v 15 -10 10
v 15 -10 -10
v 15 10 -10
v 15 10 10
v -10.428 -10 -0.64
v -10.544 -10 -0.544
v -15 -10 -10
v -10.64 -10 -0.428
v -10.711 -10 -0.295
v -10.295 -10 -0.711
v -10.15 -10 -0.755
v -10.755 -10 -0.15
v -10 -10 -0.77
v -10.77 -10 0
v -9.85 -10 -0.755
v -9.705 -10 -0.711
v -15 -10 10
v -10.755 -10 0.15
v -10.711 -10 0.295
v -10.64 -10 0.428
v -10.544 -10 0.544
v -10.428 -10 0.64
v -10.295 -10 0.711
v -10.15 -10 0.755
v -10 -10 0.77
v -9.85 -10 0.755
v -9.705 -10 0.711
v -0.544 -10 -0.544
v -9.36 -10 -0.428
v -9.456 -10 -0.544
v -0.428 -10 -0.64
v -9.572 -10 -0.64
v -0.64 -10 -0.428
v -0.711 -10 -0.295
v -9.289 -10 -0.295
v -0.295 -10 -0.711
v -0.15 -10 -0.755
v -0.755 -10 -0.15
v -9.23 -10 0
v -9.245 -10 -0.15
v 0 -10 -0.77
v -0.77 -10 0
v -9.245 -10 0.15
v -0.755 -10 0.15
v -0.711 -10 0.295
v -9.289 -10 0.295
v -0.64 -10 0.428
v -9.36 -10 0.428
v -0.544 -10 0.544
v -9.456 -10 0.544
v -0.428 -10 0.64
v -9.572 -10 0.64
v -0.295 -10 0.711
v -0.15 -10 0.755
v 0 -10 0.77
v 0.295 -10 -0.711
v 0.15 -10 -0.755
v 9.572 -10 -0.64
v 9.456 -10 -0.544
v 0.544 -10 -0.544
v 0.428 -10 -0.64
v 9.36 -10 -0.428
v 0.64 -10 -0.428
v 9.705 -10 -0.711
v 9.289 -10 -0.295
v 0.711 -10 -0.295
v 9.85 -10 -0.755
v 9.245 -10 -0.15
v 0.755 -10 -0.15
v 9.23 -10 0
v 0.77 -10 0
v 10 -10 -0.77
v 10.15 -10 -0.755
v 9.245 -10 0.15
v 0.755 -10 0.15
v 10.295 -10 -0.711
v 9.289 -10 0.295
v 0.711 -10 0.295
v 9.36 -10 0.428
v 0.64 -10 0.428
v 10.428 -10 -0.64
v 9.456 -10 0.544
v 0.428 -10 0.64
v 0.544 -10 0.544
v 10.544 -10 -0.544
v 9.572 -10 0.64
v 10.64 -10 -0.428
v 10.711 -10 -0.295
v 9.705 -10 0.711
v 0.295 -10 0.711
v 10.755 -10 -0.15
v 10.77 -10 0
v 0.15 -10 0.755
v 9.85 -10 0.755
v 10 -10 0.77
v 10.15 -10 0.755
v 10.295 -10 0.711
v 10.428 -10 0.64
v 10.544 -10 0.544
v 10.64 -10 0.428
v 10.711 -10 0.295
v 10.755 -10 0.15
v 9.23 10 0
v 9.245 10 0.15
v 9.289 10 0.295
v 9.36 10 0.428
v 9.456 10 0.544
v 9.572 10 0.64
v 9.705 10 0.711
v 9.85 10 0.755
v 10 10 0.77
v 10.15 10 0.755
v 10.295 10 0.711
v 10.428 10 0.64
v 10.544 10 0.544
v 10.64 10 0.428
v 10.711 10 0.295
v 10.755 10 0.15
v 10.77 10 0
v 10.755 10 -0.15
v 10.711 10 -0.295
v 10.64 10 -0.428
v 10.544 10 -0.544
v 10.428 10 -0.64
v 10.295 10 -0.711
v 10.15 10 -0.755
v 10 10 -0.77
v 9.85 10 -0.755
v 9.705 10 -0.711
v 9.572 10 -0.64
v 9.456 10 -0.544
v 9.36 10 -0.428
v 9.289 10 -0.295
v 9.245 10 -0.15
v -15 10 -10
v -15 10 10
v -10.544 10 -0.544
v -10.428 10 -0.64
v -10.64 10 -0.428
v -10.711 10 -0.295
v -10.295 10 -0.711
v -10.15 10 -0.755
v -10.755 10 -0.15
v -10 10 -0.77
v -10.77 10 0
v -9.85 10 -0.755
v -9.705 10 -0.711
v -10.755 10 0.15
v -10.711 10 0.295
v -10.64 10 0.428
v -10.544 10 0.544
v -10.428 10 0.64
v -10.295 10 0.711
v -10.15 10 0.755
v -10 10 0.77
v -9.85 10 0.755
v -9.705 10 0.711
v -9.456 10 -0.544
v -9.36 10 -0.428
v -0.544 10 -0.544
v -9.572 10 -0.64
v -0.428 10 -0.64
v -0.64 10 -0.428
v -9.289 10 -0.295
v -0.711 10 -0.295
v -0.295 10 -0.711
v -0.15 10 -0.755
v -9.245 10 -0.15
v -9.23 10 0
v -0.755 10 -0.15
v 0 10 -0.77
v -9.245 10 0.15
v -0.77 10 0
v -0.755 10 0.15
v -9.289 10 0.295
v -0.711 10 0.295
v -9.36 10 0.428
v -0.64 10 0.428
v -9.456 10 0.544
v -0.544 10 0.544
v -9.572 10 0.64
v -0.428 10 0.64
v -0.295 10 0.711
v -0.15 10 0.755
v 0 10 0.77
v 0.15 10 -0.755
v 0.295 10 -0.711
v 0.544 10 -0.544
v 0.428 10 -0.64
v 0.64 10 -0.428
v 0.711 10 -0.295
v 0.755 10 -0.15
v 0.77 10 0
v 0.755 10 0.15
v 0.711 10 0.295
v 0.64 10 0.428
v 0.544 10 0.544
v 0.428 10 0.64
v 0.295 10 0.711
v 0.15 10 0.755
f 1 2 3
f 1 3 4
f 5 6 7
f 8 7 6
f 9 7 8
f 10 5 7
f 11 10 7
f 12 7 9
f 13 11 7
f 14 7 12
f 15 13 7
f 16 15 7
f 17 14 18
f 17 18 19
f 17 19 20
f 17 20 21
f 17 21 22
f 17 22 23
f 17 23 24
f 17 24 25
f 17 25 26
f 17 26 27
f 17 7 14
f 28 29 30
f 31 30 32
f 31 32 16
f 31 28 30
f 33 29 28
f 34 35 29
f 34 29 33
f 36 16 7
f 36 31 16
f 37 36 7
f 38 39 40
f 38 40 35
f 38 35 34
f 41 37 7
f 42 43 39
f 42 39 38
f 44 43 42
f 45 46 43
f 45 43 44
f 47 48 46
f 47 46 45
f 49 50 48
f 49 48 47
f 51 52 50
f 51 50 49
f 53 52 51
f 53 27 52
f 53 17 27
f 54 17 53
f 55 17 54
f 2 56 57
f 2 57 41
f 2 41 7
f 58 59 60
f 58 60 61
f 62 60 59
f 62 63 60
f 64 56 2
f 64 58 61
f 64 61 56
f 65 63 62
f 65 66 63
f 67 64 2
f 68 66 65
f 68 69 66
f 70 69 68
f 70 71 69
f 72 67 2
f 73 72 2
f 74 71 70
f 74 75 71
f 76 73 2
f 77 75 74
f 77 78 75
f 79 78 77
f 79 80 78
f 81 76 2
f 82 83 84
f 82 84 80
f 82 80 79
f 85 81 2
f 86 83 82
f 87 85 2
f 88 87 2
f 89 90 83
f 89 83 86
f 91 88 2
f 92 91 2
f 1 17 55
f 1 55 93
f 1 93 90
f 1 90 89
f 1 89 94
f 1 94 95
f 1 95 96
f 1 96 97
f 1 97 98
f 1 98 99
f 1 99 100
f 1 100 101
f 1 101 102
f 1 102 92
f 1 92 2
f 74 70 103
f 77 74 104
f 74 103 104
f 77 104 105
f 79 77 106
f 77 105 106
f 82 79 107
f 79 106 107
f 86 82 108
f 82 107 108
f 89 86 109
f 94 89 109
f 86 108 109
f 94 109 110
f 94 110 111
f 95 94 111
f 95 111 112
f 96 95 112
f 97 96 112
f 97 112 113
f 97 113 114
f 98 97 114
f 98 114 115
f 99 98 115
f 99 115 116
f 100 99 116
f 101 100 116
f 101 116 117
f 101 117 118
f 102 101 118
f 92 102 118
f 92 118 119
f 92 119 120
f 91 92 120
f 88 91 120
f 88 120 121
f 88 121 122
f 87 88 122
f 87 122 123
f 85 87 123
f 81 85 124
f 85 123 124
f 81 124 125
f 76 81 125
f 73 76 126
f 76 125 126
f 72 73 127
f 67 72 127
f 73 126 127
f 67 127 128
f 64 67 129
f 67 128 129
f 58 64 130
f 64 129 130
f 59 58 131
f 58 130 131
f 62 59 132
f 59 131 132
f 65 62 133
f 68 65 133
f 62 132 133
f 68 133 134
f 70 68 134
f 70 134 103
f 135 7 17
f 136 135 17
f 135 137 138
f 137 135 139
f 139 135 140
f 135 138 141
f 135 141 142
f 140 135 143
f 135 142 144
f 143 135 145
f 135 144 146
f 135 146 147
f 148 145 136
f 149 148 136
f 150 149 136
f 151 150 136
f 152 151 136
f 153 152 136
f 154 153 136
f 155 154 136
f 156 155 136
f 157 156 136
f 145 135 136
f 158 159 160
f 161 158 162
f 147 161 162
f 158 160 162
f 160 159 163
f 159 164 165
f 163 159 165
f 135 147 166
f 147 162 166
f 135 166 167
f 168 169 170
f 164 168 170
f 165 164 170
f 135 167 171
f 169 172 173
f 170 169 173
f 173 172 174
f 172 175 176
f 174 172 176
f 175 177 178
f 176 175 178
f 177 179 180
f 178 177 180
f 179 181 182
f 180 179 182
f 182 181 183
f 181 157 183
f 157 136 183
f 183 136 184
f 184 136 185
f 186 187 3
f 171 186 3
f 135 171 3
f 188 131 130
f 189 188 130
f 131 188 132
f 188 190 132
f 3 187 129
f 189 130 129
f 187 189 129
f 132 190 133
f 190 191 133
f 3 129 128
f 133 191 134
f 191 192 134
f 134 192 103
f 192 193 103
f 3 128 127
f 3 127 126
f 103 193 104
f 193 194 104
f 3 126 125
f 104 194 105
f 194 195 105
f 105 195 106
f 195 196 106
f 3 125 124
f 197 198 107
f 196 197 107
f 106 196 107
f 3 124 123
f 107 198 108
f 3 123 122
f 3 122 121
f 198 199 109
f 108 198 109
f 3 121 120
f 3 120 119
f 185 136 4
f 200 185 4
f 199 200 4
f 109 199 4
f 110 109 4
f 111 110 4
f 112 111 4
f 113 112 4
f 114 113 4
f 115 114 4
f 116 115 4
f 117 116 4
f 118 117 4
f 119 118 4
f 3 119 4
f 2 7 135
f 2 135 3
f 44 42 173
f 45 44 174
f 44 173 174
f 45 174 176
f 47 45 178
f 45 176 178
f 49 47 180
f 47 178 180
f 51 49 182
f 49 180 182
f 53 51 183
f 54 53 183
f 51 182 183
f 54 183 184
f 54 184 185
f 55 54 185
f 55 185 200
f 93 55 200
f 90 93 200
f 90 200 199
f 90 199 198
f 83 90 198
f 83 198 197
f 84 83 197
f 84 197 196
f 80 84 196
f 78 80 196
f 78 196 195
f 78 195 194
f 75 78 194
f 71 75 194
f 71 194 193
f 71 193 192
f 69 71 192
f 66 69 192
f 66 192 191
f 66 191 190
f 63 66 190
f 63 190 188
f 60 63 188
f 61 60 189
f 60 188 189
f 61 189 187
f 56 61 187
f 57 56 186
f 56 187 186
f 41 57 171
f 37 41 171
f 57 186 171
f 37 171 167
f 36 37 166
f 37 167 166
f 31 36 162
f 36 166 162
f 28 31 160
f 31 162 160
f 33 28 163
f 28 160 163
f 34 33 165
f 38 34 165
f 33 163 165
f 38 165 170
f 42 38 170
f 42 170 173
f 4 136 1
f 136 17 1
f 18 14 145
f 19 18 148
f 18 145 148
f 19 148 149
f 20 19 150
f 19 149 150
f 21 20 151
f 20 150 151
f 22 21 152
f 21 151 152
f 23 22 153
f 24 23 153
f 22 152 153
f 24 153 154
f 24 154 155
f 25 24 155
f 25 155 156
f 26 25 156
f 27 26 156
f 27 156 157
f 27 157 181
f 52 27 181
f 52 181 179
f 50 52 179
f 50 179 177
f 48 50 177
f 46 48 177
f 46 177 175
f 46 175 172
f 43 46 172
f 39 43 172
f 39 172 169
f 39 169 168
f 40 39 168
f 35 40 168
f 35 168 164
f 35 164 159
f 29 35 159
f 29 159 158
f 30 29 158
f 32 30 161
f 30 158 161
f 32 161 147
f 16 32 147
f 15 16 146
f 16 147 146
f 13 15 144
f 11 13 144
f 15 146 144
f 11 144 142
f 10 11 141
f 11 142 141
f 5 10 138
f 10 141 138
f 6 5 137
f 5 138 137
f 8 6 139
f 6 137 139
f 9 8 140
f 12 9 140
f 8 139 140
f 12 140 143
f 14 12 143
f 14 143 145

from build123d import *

# Parameters (mm, degrees)
F0_W     = 30
F0_H     = 20
F1_DEPTH = 10
F3_D     = 1.54


with BuildPart() as f1:
    # F0 (on Front) → F1 (new body, symmetric)
    with BuildSketch(Plane.XZ):
        Rectangle(F0_W, F0_H)
    extrude(amount=F1_DEPTH, both=True)

    # F3 (through all)
    with Locations(Plane.XZ.offset(10)):
        with Locations((-10, 0), (0, 0), (10, 0)):
            Hole(F3_D / 2)


solid = f1.part
